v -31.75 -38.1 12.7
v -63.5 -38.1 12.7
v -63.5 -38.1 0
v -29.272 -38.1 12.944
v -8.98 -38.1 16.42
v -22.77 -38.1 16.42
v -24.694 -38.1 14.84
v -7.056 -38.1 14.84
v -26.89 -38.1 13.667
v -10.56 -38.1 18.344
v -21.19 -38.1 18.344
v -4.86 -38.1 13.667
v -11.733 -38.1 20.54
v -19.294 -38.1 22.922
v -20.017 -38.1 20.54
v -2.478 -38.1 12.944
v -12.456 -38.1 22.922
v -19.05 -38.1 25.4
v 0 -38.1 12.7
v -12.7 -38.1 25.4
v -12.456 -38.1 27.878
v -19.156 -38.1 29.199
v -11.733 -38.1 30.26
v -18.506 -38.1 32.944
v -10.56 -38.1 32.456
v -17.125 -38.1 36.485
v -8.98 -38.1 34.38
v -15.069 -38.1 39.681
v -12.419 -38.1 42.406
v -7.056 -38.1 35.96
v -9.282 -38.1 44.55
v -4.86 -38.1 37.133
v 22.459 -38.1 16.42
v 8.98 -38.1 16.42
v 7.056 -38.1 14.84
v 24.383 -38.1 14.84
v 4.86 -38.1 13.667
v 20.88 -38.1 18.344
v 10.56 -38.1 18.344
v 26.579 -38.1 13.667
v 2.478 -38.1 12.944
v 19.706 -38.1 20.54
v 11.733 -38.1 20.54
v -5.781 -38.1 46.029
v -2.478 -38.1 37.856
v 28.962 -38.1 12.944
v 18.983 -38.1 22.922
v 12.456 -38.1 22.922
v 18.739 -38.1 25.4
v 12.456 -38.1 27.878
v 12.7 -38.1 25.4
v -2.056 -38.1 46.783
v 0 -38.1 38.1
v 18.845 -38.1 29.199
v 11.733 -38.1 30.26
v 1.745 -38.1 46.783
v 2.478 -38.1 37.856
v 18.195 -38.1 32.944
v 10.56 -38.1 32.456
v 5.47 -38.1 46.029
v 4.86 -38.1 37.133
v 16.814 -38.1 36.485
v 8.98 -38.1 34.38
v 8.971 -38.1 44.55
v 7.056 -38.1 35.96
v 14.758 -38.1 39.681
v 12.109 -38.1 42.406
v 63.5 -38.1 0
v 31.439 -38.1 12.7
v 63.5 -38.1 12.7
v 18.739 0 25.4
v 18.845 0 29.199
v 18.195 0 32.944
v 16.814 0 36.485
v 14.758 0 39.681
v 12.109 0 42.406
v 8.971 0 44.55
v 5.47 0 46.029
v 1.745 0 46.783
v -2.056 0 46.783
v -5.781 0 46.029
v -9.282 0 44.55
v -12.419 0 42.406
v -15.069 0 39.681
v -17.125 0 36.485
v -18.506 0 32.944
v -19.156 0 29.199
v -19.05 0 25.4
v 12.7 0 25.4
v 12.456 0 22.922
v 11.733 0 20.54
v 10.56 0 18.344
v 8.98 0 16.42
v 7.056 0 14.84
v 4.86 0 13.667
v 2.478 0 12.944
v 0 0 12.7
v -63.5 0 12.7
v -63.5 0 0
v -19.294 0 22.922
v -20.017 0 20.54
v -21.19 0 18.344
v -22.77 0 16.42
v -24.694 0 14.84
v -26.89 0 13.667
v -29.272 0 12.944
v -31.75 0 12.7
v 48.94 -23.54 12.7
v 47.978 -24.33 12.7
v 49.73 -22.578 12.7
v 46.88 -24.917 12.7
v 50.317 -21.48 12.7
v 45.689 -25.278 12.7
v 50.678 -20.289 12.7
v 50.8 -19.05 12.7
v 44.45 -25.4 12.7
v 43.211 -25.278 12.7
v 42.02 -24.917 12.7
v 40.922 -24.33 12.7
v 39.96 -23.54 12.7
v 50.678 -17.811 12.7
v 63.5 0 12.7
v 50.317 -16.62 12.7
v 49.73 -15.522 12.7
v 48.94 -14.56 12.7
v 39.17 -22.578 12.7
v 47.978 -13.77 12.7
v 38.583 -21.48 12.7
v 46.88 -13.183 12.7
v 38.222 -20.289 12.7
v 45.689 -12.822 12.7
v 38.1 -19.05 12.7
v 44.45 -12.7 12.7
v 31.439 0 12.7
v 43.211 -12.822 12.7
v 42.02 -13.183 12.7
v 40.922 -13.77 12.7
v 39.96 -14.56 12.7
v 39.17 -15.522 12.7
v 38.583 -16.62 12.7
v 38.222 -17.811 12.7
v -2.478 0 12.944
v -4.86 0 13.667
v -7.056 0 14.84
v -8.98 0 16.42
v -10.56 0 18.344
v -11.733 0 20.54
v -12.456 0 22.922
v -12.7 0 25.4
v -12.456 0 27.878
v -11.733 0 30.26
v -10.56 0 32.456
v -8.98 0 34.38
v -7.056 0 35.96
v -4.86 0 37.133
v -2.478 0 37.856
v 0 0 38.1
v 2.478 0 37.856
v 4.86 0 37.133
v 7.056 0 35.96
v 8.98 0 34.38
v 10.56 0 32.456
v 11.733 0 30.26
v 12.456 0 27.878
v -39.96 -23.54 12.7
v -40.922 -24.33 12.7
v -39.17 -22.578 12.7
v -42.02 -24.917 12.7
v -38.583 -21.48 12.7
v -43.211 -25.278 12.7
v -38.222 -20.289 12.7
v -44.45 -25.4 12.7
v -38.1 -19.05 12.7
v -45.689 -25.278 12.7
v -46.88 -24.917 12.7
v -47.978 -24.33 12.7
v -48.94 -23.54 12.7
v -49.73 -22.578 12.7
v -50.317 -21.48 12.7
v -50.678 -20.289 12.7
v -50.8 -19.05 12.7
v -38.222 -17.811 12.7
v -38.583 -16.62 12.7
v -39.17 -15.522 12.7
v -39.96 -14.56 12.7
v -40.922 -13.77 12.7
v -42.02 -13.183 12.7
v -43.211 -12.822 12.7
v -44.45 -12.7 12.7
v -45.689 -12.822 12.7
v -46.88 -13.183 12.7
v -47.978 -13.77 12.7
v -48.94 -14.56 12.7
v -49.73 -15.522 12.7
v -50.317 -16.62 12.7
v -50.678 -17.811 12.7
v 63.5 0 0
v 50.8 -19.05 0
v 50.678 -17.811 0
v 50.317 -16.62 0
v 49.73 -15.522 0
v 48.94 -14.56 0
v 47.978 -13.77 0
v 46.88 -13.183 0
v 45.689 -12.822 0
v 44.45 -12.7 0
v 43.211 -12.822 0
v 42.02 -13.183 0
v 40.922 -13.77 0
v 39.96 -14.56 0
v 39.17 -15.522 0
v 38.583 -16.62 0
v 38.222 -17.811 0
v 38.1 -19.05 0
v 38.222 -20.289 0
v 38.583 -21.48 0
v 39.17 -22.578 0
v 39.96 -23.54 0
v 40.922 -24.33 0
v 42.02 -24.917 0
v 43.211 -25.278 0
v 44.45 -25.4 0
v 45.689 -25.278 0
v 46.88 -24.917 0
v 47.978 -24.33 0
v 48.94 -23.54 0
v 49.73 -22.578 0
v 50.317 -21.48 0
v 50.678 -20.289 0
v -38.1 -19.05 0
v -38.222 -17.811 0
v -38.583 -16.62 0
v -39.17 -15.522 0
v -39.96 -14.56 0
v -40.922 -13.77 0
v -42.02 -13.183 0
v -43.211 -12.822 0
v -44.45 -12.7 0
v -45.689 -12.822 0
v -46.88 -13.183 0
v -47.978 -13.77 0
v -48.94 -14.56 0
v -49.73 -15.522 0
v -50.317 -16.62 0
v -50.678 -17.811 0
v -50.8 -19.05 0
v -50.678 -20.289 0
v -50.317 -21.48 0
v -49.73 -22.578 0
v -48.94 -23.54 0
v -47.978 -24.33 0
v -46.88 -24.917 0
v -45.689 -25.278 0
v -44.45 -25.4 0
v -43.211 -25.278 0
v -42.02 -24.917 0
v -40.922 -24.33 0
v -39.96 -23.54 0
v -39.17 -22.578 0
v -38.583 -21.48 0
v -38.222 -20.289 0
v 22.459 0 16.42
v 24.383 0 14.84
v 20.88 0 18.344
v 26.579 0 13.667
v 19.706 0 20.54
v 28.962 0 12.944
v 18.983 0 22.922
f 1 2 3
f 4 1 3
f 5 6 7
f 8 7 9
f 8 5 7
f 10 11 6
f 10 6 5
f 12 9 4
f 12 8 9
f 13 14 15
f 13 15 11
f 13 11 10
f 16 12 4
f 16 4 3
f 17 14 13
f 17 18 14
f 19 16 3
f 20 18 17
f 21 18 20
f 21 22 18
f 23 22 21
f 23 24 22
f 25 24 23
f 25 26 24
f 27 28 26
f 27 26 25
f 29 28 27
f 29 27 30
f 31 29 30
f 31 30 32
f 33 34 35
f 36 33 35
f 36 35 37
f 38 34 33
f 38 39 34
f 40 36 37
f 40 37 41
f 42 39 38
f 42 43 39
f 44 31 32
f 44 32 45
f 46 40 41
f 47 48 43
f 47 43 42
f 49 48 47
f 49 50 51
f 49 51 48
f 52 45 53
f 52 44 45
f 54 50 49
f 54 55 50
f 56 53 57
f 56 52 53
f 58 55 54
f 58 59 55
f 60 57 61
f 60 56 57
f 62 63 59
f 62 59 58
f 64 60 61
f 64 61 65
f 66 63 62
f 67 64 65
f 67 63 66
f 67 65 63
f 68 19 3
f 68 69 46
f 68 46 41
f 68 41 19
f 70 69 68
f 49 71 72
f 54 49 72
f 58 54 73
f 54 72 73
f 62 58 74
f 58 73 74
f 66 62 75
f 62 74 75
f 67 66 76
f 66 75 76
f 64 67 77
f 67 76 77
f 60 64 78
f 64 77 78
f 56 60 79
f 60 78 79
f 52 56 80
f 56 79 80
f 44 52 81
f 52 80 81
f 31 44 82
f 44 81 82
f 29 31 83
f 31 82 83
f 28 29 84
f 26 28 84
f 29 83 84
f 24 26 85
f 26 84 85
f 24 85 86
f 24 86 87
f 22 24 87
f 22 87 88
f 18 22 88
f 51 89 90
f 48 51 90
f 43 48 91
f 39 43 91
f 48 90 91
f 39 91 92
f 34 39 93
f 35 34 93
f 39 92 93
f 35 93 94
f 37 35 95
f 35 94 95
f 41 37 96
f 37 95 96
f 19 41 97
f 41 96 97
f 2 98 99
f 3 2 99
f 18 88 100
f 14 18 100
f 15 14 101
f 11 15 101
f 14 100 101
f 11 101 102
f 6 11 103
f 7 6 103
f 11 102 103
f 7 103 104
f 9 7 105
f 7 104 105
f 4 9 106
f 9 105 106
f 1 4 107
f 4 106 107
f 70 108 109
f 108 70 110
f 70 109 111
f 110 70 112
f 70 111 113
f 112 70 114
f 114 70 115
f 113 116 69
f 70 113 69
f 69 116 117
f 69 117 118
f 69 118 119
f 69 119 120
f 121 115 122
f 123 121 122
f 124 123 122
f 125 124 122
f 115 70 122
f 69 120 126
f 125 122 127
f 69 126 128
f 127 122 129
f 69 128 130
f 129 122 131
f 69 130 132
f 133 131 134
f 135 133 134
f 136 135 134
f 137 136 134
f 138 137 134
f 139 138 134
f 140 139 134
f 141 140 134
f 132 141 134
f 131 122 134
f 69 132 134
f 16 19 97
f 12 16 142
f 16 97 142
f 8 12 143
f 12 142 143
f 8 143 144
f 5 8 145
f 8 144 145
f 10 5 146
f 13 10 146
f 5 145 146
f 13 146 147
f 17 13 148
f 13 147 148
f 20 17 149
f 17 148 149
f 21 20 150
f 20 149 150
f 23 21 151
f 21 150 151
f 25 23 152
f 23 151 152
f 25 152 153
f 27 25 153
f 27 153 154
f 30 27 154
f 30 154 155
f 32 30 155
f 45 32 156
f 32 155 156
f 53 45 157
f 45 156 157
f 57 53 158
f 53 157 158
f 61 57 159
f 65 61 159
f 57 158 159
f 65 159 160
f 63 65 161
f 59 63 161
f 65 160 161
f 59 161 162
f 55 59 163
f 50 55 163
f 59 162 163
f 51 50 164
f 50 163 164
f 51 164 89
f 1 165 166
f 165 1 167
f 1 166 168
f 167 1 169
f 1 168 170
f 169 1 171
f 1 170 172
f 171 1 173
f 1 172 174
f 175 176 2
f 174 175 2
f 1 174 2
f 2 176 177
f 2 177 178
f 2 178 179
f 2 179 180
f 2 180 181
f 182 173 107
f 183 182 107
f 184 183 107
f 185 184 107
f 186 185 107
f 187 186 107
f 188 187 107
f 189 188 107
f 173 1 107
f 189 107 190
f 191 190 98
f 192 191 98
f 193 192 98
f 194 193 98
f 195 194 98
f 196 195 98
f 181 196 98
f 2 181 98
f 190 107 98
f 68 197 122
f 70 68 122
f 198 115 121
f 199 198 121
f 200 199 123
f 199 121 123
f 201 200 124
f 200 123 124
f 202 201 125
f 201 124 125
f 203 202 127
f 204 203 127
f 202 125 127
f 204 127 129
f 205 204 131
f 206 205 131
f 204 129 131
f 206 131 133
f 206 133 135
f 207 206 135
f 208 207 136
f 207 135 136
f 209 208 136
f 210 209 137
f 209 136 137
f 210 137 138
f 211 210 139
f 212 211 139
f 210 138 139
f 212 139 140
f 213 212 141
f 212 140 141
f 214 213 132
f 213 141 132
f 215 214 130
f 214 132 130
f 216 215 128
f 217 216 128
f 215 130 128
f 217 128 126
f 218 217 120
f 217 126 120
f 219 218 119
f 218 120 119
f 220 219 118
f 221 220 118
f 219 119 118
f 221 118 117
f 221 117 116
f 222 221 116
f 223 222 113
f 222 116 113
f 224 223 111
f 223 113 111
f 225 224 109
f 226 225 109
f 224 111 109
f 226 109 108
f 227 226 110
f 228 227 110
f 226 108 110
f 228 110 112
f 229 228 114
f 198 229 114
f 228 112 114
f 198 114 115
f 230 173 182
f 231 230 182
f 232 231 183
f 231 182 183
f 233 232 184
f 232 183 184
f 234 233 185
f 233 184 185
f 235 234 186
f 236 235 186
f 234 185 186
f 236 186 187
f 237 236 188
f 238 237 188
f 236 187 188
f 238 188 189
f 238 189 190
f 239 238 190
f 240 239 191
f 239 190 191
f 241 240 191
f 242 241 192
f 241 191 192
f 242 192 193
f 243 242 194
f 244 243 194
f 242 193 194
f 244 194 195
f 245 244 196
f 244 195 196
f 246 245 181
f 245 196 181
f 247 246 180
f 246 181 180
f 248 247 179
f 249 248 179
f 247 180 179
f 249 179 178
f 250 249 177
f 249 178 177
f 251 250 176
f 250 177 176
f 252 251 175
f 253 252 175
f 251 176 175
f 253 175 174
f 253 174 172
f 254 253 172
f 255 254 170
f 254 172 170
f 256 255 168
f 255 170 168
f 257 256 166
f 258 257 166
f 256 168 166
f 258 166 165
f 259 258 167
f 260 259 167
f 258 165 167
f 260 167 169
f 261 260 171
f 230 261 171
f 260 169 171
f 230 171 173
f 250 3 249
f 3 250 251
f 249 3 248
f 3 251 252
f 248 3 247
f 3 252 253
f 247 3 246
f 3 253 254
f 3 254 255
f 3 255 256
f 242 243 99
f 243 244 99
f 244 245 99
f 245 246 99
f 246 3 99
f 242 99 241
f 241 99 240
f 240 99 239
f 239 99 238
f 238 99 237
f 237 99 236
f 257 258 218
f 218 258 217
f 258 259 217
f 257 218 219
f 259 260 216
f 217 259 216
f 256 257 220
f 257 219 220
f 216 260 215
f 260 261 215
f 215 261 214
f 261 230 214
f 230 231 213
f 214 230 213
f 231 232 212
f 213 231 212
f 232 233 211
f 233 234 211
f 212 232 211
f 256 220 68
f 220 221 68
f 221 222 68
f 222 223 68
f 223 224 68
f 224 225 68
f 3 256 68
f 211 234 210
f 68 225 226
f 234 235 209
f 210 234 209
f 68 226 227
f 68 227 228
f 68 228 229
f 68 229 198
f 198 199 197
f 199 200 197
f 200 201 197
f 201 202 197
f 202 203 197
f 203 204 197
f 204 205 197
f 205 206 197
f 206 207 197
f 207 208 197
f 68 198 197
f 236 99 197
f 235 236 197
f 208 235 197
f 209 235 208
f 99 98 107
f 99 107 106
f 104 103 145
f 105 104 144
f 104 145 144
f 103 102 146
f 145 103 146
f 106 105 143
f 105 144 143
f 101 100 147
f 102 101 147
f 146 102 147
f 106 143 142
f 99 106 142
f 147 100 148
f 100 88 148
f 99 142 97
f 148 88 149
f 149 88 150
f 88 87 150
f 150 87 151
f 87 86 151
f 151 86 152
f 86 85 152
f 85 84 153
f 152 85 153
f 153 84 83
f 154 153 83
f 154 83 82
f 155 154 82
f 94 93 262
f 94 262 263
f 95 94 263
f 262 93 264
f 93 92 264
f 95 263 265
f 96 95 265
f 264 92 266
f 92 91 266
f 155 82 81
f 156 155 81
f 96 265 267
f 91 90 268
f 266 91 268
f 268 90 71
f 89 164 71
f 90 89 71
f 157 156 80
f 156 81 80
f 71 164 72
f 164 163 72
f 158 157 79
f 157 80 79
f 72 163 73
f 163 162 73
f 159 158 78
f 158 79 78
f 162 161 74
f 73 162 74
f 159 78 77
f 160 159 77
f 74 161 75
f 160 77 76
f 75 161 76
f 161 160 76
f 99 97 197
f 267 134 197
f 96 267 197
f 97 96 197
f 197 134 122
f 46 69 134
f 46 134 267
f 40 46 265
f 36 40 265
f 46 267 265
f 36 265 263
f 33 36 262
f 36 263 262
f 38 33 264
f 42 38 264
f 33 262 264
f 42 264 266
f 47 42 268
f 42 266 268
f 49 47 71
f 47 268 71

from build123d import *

# Parameters (mm, degrees)
F1_DEPTH = 38.1
F2_R     = 6.35
F3_DEPTH = 12.7
F4_DEPTH = 12.7


with BuildPart() as f1:
    # F0 (on Front) → F1 (new body)
    with BuildSketch(Plane.XZ):
        with BuildLine():
            ThreePointArc((12.7, 25.4), (-8.980256, 34.380256), (0, 12.7))
            ThreePointArc((0, 12.7), (8.980256, 16.419744), (12.7, 25.4))
        make_face()
        with BuildLine():
            Line((-63.5, 12.7), (-63.5, 0))
            Line((-63.5, 0), (0, 0))
            Line((0, 0), (63.5, 0))
            Line((63.5, 0), (63.5, 12.7))
            Line((63.5, 12.7), (37.5412, 12.7))
            Line((37.5412, 12.7), (31.439186, 12.7))
            ThreePointArc((31.439186, 12.7), (22.45893, 16.419744), (18.739186, 25.4))
            ThreePointArc((18.739186, 25.4), (-0.155407, 46.878344), (-19.05, 25.4))
            ThreePointArc((-19.05, 25.4), (-22.769744, 16.419744), (-31.75, 12.7))
            Line((-31.75, 12.7), (-37.5412, 12.7))
            Line((-37.5412, 12.7), (-63.5, 12.7))
        make_face()
        with BuildLine():
            ThreePointArc((12.7, 25.4), (8.980256, 16.419744), (0, 12.7))
            ThreePointArc((0, 12.7), (-8.980256, 34.380256), (12.7, 25.4))
        make_face(mode=Mode.SUBTRACT)
    extrude(amount=F1_DEPTH)

    # F2 (on face) → F3 (cut, through all)
    with BuildSketch(Plane.XY.offset(12.7)):
        with Locations((-44.45, -19.05)):
            Circle(F2_R)
    extrude(amount=-F3_DEPTH, mode=Mode.SUBTRACT)

    # F2 (on face) → F4 (cut, through all)
    with BuildSketch(Plane.XY.offset(12.7)):
        with Locations((44.45, -19.05)):
            Circle(F2_R)
        with Locations((-44.45, -19.05)):
            Circle(F2_R)
    extrude(amount=-F4_DEPTH, mode=Mode.SUBTRACT)


solid = f1.part
